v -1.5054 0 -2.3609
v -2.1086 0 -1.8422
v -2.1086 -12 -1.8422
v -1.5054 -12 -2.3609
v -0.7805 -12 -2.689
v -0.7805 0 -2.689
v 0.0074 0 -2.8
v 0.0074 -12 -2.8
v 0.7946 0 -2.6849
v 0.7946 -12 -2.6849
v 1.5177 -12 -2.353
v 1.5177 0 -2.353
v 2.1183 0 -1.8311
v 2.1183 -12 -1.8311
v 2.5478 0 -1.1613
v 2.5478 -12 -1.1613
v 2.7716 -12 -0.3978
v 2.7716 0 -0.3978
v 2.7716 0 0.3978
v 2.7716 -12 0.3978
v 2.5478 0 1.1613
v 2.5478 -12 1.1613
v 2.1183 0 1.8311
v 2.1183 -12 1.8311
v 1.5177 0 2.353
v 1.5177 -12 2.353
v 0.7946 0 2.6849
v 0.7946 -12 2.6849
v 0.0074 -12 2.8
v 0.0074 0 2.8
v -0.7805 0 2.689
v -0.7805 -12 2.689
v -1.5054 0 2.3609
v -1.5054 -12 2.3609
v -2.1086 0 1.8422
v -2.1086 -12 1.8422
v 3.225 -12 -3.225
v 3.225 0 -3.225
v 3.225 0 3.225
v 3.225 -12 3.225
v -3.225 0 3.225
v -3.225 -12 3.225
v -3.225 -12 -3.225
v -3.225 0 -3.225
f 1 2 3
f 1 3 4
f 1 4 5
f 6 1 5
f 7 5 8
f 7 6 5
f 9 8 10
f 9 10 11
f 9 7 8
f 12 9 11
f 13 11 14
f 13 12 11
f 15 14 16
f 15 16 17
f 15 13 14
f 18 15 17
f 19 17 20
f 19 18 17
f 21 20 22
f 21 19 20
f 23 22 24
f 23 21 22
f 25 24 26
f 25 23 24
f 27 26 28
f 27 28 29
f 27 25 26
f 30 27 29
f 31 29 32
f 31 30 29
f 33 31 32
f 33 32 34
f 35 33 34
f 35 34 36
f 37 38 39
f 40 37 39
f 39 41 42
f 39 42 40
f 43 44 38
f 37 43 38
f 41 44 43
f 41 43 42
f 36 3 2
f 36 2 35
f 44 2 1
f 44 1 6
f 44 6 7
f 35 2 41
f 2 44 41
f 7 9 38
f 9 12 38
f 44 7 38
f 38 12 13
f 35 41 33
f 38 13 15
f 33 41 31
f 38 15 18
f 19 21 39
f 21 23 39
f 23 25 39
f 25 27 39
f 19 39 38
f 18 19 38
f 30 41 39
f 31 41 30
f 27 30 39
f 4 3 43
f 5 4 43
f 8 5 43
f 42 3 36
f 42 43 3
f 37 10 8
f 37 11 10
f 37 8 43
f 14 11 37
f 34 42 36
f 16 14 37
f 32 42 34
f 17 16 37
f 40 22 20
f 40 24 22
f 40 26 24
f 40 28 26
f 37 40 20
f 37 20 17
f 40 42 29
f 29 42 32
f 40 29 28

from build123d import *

# Parameters (mm, degrees)
F0_W     = 6.45
F0_H     = 6.45
F2_DEPTH = 12
F1_R     = 2.8
F3_DEPTH = 12
F4_W     = 0.8
F4_H     = 5.918589
F5_DEPTH = 12


with BuildPart() as f2:
    # F0 (on Front) → F2 (new body)
    with BuildSketch(Plane.XZ):
        Rectangle(F0_W, F0_H)
    extrude(amount=F2_DEPTH)

    # F1 (on Front) → F3 (cut)
    with BuildSketch(Plane.XZ):
        Circle(F1_R)
    extrude(amount=F3_DEPTH, mode=Mode.SUBTRACT)

    # F4 (on Front) → F5 (join)
    with BuildSketch(Plane.XZ):
        with Locations((-2.508641, 0.172032)):
            Rectangle(F4_W, F4_H)
    extrude(amount=F5_DEPTH)


solid = f2.part
